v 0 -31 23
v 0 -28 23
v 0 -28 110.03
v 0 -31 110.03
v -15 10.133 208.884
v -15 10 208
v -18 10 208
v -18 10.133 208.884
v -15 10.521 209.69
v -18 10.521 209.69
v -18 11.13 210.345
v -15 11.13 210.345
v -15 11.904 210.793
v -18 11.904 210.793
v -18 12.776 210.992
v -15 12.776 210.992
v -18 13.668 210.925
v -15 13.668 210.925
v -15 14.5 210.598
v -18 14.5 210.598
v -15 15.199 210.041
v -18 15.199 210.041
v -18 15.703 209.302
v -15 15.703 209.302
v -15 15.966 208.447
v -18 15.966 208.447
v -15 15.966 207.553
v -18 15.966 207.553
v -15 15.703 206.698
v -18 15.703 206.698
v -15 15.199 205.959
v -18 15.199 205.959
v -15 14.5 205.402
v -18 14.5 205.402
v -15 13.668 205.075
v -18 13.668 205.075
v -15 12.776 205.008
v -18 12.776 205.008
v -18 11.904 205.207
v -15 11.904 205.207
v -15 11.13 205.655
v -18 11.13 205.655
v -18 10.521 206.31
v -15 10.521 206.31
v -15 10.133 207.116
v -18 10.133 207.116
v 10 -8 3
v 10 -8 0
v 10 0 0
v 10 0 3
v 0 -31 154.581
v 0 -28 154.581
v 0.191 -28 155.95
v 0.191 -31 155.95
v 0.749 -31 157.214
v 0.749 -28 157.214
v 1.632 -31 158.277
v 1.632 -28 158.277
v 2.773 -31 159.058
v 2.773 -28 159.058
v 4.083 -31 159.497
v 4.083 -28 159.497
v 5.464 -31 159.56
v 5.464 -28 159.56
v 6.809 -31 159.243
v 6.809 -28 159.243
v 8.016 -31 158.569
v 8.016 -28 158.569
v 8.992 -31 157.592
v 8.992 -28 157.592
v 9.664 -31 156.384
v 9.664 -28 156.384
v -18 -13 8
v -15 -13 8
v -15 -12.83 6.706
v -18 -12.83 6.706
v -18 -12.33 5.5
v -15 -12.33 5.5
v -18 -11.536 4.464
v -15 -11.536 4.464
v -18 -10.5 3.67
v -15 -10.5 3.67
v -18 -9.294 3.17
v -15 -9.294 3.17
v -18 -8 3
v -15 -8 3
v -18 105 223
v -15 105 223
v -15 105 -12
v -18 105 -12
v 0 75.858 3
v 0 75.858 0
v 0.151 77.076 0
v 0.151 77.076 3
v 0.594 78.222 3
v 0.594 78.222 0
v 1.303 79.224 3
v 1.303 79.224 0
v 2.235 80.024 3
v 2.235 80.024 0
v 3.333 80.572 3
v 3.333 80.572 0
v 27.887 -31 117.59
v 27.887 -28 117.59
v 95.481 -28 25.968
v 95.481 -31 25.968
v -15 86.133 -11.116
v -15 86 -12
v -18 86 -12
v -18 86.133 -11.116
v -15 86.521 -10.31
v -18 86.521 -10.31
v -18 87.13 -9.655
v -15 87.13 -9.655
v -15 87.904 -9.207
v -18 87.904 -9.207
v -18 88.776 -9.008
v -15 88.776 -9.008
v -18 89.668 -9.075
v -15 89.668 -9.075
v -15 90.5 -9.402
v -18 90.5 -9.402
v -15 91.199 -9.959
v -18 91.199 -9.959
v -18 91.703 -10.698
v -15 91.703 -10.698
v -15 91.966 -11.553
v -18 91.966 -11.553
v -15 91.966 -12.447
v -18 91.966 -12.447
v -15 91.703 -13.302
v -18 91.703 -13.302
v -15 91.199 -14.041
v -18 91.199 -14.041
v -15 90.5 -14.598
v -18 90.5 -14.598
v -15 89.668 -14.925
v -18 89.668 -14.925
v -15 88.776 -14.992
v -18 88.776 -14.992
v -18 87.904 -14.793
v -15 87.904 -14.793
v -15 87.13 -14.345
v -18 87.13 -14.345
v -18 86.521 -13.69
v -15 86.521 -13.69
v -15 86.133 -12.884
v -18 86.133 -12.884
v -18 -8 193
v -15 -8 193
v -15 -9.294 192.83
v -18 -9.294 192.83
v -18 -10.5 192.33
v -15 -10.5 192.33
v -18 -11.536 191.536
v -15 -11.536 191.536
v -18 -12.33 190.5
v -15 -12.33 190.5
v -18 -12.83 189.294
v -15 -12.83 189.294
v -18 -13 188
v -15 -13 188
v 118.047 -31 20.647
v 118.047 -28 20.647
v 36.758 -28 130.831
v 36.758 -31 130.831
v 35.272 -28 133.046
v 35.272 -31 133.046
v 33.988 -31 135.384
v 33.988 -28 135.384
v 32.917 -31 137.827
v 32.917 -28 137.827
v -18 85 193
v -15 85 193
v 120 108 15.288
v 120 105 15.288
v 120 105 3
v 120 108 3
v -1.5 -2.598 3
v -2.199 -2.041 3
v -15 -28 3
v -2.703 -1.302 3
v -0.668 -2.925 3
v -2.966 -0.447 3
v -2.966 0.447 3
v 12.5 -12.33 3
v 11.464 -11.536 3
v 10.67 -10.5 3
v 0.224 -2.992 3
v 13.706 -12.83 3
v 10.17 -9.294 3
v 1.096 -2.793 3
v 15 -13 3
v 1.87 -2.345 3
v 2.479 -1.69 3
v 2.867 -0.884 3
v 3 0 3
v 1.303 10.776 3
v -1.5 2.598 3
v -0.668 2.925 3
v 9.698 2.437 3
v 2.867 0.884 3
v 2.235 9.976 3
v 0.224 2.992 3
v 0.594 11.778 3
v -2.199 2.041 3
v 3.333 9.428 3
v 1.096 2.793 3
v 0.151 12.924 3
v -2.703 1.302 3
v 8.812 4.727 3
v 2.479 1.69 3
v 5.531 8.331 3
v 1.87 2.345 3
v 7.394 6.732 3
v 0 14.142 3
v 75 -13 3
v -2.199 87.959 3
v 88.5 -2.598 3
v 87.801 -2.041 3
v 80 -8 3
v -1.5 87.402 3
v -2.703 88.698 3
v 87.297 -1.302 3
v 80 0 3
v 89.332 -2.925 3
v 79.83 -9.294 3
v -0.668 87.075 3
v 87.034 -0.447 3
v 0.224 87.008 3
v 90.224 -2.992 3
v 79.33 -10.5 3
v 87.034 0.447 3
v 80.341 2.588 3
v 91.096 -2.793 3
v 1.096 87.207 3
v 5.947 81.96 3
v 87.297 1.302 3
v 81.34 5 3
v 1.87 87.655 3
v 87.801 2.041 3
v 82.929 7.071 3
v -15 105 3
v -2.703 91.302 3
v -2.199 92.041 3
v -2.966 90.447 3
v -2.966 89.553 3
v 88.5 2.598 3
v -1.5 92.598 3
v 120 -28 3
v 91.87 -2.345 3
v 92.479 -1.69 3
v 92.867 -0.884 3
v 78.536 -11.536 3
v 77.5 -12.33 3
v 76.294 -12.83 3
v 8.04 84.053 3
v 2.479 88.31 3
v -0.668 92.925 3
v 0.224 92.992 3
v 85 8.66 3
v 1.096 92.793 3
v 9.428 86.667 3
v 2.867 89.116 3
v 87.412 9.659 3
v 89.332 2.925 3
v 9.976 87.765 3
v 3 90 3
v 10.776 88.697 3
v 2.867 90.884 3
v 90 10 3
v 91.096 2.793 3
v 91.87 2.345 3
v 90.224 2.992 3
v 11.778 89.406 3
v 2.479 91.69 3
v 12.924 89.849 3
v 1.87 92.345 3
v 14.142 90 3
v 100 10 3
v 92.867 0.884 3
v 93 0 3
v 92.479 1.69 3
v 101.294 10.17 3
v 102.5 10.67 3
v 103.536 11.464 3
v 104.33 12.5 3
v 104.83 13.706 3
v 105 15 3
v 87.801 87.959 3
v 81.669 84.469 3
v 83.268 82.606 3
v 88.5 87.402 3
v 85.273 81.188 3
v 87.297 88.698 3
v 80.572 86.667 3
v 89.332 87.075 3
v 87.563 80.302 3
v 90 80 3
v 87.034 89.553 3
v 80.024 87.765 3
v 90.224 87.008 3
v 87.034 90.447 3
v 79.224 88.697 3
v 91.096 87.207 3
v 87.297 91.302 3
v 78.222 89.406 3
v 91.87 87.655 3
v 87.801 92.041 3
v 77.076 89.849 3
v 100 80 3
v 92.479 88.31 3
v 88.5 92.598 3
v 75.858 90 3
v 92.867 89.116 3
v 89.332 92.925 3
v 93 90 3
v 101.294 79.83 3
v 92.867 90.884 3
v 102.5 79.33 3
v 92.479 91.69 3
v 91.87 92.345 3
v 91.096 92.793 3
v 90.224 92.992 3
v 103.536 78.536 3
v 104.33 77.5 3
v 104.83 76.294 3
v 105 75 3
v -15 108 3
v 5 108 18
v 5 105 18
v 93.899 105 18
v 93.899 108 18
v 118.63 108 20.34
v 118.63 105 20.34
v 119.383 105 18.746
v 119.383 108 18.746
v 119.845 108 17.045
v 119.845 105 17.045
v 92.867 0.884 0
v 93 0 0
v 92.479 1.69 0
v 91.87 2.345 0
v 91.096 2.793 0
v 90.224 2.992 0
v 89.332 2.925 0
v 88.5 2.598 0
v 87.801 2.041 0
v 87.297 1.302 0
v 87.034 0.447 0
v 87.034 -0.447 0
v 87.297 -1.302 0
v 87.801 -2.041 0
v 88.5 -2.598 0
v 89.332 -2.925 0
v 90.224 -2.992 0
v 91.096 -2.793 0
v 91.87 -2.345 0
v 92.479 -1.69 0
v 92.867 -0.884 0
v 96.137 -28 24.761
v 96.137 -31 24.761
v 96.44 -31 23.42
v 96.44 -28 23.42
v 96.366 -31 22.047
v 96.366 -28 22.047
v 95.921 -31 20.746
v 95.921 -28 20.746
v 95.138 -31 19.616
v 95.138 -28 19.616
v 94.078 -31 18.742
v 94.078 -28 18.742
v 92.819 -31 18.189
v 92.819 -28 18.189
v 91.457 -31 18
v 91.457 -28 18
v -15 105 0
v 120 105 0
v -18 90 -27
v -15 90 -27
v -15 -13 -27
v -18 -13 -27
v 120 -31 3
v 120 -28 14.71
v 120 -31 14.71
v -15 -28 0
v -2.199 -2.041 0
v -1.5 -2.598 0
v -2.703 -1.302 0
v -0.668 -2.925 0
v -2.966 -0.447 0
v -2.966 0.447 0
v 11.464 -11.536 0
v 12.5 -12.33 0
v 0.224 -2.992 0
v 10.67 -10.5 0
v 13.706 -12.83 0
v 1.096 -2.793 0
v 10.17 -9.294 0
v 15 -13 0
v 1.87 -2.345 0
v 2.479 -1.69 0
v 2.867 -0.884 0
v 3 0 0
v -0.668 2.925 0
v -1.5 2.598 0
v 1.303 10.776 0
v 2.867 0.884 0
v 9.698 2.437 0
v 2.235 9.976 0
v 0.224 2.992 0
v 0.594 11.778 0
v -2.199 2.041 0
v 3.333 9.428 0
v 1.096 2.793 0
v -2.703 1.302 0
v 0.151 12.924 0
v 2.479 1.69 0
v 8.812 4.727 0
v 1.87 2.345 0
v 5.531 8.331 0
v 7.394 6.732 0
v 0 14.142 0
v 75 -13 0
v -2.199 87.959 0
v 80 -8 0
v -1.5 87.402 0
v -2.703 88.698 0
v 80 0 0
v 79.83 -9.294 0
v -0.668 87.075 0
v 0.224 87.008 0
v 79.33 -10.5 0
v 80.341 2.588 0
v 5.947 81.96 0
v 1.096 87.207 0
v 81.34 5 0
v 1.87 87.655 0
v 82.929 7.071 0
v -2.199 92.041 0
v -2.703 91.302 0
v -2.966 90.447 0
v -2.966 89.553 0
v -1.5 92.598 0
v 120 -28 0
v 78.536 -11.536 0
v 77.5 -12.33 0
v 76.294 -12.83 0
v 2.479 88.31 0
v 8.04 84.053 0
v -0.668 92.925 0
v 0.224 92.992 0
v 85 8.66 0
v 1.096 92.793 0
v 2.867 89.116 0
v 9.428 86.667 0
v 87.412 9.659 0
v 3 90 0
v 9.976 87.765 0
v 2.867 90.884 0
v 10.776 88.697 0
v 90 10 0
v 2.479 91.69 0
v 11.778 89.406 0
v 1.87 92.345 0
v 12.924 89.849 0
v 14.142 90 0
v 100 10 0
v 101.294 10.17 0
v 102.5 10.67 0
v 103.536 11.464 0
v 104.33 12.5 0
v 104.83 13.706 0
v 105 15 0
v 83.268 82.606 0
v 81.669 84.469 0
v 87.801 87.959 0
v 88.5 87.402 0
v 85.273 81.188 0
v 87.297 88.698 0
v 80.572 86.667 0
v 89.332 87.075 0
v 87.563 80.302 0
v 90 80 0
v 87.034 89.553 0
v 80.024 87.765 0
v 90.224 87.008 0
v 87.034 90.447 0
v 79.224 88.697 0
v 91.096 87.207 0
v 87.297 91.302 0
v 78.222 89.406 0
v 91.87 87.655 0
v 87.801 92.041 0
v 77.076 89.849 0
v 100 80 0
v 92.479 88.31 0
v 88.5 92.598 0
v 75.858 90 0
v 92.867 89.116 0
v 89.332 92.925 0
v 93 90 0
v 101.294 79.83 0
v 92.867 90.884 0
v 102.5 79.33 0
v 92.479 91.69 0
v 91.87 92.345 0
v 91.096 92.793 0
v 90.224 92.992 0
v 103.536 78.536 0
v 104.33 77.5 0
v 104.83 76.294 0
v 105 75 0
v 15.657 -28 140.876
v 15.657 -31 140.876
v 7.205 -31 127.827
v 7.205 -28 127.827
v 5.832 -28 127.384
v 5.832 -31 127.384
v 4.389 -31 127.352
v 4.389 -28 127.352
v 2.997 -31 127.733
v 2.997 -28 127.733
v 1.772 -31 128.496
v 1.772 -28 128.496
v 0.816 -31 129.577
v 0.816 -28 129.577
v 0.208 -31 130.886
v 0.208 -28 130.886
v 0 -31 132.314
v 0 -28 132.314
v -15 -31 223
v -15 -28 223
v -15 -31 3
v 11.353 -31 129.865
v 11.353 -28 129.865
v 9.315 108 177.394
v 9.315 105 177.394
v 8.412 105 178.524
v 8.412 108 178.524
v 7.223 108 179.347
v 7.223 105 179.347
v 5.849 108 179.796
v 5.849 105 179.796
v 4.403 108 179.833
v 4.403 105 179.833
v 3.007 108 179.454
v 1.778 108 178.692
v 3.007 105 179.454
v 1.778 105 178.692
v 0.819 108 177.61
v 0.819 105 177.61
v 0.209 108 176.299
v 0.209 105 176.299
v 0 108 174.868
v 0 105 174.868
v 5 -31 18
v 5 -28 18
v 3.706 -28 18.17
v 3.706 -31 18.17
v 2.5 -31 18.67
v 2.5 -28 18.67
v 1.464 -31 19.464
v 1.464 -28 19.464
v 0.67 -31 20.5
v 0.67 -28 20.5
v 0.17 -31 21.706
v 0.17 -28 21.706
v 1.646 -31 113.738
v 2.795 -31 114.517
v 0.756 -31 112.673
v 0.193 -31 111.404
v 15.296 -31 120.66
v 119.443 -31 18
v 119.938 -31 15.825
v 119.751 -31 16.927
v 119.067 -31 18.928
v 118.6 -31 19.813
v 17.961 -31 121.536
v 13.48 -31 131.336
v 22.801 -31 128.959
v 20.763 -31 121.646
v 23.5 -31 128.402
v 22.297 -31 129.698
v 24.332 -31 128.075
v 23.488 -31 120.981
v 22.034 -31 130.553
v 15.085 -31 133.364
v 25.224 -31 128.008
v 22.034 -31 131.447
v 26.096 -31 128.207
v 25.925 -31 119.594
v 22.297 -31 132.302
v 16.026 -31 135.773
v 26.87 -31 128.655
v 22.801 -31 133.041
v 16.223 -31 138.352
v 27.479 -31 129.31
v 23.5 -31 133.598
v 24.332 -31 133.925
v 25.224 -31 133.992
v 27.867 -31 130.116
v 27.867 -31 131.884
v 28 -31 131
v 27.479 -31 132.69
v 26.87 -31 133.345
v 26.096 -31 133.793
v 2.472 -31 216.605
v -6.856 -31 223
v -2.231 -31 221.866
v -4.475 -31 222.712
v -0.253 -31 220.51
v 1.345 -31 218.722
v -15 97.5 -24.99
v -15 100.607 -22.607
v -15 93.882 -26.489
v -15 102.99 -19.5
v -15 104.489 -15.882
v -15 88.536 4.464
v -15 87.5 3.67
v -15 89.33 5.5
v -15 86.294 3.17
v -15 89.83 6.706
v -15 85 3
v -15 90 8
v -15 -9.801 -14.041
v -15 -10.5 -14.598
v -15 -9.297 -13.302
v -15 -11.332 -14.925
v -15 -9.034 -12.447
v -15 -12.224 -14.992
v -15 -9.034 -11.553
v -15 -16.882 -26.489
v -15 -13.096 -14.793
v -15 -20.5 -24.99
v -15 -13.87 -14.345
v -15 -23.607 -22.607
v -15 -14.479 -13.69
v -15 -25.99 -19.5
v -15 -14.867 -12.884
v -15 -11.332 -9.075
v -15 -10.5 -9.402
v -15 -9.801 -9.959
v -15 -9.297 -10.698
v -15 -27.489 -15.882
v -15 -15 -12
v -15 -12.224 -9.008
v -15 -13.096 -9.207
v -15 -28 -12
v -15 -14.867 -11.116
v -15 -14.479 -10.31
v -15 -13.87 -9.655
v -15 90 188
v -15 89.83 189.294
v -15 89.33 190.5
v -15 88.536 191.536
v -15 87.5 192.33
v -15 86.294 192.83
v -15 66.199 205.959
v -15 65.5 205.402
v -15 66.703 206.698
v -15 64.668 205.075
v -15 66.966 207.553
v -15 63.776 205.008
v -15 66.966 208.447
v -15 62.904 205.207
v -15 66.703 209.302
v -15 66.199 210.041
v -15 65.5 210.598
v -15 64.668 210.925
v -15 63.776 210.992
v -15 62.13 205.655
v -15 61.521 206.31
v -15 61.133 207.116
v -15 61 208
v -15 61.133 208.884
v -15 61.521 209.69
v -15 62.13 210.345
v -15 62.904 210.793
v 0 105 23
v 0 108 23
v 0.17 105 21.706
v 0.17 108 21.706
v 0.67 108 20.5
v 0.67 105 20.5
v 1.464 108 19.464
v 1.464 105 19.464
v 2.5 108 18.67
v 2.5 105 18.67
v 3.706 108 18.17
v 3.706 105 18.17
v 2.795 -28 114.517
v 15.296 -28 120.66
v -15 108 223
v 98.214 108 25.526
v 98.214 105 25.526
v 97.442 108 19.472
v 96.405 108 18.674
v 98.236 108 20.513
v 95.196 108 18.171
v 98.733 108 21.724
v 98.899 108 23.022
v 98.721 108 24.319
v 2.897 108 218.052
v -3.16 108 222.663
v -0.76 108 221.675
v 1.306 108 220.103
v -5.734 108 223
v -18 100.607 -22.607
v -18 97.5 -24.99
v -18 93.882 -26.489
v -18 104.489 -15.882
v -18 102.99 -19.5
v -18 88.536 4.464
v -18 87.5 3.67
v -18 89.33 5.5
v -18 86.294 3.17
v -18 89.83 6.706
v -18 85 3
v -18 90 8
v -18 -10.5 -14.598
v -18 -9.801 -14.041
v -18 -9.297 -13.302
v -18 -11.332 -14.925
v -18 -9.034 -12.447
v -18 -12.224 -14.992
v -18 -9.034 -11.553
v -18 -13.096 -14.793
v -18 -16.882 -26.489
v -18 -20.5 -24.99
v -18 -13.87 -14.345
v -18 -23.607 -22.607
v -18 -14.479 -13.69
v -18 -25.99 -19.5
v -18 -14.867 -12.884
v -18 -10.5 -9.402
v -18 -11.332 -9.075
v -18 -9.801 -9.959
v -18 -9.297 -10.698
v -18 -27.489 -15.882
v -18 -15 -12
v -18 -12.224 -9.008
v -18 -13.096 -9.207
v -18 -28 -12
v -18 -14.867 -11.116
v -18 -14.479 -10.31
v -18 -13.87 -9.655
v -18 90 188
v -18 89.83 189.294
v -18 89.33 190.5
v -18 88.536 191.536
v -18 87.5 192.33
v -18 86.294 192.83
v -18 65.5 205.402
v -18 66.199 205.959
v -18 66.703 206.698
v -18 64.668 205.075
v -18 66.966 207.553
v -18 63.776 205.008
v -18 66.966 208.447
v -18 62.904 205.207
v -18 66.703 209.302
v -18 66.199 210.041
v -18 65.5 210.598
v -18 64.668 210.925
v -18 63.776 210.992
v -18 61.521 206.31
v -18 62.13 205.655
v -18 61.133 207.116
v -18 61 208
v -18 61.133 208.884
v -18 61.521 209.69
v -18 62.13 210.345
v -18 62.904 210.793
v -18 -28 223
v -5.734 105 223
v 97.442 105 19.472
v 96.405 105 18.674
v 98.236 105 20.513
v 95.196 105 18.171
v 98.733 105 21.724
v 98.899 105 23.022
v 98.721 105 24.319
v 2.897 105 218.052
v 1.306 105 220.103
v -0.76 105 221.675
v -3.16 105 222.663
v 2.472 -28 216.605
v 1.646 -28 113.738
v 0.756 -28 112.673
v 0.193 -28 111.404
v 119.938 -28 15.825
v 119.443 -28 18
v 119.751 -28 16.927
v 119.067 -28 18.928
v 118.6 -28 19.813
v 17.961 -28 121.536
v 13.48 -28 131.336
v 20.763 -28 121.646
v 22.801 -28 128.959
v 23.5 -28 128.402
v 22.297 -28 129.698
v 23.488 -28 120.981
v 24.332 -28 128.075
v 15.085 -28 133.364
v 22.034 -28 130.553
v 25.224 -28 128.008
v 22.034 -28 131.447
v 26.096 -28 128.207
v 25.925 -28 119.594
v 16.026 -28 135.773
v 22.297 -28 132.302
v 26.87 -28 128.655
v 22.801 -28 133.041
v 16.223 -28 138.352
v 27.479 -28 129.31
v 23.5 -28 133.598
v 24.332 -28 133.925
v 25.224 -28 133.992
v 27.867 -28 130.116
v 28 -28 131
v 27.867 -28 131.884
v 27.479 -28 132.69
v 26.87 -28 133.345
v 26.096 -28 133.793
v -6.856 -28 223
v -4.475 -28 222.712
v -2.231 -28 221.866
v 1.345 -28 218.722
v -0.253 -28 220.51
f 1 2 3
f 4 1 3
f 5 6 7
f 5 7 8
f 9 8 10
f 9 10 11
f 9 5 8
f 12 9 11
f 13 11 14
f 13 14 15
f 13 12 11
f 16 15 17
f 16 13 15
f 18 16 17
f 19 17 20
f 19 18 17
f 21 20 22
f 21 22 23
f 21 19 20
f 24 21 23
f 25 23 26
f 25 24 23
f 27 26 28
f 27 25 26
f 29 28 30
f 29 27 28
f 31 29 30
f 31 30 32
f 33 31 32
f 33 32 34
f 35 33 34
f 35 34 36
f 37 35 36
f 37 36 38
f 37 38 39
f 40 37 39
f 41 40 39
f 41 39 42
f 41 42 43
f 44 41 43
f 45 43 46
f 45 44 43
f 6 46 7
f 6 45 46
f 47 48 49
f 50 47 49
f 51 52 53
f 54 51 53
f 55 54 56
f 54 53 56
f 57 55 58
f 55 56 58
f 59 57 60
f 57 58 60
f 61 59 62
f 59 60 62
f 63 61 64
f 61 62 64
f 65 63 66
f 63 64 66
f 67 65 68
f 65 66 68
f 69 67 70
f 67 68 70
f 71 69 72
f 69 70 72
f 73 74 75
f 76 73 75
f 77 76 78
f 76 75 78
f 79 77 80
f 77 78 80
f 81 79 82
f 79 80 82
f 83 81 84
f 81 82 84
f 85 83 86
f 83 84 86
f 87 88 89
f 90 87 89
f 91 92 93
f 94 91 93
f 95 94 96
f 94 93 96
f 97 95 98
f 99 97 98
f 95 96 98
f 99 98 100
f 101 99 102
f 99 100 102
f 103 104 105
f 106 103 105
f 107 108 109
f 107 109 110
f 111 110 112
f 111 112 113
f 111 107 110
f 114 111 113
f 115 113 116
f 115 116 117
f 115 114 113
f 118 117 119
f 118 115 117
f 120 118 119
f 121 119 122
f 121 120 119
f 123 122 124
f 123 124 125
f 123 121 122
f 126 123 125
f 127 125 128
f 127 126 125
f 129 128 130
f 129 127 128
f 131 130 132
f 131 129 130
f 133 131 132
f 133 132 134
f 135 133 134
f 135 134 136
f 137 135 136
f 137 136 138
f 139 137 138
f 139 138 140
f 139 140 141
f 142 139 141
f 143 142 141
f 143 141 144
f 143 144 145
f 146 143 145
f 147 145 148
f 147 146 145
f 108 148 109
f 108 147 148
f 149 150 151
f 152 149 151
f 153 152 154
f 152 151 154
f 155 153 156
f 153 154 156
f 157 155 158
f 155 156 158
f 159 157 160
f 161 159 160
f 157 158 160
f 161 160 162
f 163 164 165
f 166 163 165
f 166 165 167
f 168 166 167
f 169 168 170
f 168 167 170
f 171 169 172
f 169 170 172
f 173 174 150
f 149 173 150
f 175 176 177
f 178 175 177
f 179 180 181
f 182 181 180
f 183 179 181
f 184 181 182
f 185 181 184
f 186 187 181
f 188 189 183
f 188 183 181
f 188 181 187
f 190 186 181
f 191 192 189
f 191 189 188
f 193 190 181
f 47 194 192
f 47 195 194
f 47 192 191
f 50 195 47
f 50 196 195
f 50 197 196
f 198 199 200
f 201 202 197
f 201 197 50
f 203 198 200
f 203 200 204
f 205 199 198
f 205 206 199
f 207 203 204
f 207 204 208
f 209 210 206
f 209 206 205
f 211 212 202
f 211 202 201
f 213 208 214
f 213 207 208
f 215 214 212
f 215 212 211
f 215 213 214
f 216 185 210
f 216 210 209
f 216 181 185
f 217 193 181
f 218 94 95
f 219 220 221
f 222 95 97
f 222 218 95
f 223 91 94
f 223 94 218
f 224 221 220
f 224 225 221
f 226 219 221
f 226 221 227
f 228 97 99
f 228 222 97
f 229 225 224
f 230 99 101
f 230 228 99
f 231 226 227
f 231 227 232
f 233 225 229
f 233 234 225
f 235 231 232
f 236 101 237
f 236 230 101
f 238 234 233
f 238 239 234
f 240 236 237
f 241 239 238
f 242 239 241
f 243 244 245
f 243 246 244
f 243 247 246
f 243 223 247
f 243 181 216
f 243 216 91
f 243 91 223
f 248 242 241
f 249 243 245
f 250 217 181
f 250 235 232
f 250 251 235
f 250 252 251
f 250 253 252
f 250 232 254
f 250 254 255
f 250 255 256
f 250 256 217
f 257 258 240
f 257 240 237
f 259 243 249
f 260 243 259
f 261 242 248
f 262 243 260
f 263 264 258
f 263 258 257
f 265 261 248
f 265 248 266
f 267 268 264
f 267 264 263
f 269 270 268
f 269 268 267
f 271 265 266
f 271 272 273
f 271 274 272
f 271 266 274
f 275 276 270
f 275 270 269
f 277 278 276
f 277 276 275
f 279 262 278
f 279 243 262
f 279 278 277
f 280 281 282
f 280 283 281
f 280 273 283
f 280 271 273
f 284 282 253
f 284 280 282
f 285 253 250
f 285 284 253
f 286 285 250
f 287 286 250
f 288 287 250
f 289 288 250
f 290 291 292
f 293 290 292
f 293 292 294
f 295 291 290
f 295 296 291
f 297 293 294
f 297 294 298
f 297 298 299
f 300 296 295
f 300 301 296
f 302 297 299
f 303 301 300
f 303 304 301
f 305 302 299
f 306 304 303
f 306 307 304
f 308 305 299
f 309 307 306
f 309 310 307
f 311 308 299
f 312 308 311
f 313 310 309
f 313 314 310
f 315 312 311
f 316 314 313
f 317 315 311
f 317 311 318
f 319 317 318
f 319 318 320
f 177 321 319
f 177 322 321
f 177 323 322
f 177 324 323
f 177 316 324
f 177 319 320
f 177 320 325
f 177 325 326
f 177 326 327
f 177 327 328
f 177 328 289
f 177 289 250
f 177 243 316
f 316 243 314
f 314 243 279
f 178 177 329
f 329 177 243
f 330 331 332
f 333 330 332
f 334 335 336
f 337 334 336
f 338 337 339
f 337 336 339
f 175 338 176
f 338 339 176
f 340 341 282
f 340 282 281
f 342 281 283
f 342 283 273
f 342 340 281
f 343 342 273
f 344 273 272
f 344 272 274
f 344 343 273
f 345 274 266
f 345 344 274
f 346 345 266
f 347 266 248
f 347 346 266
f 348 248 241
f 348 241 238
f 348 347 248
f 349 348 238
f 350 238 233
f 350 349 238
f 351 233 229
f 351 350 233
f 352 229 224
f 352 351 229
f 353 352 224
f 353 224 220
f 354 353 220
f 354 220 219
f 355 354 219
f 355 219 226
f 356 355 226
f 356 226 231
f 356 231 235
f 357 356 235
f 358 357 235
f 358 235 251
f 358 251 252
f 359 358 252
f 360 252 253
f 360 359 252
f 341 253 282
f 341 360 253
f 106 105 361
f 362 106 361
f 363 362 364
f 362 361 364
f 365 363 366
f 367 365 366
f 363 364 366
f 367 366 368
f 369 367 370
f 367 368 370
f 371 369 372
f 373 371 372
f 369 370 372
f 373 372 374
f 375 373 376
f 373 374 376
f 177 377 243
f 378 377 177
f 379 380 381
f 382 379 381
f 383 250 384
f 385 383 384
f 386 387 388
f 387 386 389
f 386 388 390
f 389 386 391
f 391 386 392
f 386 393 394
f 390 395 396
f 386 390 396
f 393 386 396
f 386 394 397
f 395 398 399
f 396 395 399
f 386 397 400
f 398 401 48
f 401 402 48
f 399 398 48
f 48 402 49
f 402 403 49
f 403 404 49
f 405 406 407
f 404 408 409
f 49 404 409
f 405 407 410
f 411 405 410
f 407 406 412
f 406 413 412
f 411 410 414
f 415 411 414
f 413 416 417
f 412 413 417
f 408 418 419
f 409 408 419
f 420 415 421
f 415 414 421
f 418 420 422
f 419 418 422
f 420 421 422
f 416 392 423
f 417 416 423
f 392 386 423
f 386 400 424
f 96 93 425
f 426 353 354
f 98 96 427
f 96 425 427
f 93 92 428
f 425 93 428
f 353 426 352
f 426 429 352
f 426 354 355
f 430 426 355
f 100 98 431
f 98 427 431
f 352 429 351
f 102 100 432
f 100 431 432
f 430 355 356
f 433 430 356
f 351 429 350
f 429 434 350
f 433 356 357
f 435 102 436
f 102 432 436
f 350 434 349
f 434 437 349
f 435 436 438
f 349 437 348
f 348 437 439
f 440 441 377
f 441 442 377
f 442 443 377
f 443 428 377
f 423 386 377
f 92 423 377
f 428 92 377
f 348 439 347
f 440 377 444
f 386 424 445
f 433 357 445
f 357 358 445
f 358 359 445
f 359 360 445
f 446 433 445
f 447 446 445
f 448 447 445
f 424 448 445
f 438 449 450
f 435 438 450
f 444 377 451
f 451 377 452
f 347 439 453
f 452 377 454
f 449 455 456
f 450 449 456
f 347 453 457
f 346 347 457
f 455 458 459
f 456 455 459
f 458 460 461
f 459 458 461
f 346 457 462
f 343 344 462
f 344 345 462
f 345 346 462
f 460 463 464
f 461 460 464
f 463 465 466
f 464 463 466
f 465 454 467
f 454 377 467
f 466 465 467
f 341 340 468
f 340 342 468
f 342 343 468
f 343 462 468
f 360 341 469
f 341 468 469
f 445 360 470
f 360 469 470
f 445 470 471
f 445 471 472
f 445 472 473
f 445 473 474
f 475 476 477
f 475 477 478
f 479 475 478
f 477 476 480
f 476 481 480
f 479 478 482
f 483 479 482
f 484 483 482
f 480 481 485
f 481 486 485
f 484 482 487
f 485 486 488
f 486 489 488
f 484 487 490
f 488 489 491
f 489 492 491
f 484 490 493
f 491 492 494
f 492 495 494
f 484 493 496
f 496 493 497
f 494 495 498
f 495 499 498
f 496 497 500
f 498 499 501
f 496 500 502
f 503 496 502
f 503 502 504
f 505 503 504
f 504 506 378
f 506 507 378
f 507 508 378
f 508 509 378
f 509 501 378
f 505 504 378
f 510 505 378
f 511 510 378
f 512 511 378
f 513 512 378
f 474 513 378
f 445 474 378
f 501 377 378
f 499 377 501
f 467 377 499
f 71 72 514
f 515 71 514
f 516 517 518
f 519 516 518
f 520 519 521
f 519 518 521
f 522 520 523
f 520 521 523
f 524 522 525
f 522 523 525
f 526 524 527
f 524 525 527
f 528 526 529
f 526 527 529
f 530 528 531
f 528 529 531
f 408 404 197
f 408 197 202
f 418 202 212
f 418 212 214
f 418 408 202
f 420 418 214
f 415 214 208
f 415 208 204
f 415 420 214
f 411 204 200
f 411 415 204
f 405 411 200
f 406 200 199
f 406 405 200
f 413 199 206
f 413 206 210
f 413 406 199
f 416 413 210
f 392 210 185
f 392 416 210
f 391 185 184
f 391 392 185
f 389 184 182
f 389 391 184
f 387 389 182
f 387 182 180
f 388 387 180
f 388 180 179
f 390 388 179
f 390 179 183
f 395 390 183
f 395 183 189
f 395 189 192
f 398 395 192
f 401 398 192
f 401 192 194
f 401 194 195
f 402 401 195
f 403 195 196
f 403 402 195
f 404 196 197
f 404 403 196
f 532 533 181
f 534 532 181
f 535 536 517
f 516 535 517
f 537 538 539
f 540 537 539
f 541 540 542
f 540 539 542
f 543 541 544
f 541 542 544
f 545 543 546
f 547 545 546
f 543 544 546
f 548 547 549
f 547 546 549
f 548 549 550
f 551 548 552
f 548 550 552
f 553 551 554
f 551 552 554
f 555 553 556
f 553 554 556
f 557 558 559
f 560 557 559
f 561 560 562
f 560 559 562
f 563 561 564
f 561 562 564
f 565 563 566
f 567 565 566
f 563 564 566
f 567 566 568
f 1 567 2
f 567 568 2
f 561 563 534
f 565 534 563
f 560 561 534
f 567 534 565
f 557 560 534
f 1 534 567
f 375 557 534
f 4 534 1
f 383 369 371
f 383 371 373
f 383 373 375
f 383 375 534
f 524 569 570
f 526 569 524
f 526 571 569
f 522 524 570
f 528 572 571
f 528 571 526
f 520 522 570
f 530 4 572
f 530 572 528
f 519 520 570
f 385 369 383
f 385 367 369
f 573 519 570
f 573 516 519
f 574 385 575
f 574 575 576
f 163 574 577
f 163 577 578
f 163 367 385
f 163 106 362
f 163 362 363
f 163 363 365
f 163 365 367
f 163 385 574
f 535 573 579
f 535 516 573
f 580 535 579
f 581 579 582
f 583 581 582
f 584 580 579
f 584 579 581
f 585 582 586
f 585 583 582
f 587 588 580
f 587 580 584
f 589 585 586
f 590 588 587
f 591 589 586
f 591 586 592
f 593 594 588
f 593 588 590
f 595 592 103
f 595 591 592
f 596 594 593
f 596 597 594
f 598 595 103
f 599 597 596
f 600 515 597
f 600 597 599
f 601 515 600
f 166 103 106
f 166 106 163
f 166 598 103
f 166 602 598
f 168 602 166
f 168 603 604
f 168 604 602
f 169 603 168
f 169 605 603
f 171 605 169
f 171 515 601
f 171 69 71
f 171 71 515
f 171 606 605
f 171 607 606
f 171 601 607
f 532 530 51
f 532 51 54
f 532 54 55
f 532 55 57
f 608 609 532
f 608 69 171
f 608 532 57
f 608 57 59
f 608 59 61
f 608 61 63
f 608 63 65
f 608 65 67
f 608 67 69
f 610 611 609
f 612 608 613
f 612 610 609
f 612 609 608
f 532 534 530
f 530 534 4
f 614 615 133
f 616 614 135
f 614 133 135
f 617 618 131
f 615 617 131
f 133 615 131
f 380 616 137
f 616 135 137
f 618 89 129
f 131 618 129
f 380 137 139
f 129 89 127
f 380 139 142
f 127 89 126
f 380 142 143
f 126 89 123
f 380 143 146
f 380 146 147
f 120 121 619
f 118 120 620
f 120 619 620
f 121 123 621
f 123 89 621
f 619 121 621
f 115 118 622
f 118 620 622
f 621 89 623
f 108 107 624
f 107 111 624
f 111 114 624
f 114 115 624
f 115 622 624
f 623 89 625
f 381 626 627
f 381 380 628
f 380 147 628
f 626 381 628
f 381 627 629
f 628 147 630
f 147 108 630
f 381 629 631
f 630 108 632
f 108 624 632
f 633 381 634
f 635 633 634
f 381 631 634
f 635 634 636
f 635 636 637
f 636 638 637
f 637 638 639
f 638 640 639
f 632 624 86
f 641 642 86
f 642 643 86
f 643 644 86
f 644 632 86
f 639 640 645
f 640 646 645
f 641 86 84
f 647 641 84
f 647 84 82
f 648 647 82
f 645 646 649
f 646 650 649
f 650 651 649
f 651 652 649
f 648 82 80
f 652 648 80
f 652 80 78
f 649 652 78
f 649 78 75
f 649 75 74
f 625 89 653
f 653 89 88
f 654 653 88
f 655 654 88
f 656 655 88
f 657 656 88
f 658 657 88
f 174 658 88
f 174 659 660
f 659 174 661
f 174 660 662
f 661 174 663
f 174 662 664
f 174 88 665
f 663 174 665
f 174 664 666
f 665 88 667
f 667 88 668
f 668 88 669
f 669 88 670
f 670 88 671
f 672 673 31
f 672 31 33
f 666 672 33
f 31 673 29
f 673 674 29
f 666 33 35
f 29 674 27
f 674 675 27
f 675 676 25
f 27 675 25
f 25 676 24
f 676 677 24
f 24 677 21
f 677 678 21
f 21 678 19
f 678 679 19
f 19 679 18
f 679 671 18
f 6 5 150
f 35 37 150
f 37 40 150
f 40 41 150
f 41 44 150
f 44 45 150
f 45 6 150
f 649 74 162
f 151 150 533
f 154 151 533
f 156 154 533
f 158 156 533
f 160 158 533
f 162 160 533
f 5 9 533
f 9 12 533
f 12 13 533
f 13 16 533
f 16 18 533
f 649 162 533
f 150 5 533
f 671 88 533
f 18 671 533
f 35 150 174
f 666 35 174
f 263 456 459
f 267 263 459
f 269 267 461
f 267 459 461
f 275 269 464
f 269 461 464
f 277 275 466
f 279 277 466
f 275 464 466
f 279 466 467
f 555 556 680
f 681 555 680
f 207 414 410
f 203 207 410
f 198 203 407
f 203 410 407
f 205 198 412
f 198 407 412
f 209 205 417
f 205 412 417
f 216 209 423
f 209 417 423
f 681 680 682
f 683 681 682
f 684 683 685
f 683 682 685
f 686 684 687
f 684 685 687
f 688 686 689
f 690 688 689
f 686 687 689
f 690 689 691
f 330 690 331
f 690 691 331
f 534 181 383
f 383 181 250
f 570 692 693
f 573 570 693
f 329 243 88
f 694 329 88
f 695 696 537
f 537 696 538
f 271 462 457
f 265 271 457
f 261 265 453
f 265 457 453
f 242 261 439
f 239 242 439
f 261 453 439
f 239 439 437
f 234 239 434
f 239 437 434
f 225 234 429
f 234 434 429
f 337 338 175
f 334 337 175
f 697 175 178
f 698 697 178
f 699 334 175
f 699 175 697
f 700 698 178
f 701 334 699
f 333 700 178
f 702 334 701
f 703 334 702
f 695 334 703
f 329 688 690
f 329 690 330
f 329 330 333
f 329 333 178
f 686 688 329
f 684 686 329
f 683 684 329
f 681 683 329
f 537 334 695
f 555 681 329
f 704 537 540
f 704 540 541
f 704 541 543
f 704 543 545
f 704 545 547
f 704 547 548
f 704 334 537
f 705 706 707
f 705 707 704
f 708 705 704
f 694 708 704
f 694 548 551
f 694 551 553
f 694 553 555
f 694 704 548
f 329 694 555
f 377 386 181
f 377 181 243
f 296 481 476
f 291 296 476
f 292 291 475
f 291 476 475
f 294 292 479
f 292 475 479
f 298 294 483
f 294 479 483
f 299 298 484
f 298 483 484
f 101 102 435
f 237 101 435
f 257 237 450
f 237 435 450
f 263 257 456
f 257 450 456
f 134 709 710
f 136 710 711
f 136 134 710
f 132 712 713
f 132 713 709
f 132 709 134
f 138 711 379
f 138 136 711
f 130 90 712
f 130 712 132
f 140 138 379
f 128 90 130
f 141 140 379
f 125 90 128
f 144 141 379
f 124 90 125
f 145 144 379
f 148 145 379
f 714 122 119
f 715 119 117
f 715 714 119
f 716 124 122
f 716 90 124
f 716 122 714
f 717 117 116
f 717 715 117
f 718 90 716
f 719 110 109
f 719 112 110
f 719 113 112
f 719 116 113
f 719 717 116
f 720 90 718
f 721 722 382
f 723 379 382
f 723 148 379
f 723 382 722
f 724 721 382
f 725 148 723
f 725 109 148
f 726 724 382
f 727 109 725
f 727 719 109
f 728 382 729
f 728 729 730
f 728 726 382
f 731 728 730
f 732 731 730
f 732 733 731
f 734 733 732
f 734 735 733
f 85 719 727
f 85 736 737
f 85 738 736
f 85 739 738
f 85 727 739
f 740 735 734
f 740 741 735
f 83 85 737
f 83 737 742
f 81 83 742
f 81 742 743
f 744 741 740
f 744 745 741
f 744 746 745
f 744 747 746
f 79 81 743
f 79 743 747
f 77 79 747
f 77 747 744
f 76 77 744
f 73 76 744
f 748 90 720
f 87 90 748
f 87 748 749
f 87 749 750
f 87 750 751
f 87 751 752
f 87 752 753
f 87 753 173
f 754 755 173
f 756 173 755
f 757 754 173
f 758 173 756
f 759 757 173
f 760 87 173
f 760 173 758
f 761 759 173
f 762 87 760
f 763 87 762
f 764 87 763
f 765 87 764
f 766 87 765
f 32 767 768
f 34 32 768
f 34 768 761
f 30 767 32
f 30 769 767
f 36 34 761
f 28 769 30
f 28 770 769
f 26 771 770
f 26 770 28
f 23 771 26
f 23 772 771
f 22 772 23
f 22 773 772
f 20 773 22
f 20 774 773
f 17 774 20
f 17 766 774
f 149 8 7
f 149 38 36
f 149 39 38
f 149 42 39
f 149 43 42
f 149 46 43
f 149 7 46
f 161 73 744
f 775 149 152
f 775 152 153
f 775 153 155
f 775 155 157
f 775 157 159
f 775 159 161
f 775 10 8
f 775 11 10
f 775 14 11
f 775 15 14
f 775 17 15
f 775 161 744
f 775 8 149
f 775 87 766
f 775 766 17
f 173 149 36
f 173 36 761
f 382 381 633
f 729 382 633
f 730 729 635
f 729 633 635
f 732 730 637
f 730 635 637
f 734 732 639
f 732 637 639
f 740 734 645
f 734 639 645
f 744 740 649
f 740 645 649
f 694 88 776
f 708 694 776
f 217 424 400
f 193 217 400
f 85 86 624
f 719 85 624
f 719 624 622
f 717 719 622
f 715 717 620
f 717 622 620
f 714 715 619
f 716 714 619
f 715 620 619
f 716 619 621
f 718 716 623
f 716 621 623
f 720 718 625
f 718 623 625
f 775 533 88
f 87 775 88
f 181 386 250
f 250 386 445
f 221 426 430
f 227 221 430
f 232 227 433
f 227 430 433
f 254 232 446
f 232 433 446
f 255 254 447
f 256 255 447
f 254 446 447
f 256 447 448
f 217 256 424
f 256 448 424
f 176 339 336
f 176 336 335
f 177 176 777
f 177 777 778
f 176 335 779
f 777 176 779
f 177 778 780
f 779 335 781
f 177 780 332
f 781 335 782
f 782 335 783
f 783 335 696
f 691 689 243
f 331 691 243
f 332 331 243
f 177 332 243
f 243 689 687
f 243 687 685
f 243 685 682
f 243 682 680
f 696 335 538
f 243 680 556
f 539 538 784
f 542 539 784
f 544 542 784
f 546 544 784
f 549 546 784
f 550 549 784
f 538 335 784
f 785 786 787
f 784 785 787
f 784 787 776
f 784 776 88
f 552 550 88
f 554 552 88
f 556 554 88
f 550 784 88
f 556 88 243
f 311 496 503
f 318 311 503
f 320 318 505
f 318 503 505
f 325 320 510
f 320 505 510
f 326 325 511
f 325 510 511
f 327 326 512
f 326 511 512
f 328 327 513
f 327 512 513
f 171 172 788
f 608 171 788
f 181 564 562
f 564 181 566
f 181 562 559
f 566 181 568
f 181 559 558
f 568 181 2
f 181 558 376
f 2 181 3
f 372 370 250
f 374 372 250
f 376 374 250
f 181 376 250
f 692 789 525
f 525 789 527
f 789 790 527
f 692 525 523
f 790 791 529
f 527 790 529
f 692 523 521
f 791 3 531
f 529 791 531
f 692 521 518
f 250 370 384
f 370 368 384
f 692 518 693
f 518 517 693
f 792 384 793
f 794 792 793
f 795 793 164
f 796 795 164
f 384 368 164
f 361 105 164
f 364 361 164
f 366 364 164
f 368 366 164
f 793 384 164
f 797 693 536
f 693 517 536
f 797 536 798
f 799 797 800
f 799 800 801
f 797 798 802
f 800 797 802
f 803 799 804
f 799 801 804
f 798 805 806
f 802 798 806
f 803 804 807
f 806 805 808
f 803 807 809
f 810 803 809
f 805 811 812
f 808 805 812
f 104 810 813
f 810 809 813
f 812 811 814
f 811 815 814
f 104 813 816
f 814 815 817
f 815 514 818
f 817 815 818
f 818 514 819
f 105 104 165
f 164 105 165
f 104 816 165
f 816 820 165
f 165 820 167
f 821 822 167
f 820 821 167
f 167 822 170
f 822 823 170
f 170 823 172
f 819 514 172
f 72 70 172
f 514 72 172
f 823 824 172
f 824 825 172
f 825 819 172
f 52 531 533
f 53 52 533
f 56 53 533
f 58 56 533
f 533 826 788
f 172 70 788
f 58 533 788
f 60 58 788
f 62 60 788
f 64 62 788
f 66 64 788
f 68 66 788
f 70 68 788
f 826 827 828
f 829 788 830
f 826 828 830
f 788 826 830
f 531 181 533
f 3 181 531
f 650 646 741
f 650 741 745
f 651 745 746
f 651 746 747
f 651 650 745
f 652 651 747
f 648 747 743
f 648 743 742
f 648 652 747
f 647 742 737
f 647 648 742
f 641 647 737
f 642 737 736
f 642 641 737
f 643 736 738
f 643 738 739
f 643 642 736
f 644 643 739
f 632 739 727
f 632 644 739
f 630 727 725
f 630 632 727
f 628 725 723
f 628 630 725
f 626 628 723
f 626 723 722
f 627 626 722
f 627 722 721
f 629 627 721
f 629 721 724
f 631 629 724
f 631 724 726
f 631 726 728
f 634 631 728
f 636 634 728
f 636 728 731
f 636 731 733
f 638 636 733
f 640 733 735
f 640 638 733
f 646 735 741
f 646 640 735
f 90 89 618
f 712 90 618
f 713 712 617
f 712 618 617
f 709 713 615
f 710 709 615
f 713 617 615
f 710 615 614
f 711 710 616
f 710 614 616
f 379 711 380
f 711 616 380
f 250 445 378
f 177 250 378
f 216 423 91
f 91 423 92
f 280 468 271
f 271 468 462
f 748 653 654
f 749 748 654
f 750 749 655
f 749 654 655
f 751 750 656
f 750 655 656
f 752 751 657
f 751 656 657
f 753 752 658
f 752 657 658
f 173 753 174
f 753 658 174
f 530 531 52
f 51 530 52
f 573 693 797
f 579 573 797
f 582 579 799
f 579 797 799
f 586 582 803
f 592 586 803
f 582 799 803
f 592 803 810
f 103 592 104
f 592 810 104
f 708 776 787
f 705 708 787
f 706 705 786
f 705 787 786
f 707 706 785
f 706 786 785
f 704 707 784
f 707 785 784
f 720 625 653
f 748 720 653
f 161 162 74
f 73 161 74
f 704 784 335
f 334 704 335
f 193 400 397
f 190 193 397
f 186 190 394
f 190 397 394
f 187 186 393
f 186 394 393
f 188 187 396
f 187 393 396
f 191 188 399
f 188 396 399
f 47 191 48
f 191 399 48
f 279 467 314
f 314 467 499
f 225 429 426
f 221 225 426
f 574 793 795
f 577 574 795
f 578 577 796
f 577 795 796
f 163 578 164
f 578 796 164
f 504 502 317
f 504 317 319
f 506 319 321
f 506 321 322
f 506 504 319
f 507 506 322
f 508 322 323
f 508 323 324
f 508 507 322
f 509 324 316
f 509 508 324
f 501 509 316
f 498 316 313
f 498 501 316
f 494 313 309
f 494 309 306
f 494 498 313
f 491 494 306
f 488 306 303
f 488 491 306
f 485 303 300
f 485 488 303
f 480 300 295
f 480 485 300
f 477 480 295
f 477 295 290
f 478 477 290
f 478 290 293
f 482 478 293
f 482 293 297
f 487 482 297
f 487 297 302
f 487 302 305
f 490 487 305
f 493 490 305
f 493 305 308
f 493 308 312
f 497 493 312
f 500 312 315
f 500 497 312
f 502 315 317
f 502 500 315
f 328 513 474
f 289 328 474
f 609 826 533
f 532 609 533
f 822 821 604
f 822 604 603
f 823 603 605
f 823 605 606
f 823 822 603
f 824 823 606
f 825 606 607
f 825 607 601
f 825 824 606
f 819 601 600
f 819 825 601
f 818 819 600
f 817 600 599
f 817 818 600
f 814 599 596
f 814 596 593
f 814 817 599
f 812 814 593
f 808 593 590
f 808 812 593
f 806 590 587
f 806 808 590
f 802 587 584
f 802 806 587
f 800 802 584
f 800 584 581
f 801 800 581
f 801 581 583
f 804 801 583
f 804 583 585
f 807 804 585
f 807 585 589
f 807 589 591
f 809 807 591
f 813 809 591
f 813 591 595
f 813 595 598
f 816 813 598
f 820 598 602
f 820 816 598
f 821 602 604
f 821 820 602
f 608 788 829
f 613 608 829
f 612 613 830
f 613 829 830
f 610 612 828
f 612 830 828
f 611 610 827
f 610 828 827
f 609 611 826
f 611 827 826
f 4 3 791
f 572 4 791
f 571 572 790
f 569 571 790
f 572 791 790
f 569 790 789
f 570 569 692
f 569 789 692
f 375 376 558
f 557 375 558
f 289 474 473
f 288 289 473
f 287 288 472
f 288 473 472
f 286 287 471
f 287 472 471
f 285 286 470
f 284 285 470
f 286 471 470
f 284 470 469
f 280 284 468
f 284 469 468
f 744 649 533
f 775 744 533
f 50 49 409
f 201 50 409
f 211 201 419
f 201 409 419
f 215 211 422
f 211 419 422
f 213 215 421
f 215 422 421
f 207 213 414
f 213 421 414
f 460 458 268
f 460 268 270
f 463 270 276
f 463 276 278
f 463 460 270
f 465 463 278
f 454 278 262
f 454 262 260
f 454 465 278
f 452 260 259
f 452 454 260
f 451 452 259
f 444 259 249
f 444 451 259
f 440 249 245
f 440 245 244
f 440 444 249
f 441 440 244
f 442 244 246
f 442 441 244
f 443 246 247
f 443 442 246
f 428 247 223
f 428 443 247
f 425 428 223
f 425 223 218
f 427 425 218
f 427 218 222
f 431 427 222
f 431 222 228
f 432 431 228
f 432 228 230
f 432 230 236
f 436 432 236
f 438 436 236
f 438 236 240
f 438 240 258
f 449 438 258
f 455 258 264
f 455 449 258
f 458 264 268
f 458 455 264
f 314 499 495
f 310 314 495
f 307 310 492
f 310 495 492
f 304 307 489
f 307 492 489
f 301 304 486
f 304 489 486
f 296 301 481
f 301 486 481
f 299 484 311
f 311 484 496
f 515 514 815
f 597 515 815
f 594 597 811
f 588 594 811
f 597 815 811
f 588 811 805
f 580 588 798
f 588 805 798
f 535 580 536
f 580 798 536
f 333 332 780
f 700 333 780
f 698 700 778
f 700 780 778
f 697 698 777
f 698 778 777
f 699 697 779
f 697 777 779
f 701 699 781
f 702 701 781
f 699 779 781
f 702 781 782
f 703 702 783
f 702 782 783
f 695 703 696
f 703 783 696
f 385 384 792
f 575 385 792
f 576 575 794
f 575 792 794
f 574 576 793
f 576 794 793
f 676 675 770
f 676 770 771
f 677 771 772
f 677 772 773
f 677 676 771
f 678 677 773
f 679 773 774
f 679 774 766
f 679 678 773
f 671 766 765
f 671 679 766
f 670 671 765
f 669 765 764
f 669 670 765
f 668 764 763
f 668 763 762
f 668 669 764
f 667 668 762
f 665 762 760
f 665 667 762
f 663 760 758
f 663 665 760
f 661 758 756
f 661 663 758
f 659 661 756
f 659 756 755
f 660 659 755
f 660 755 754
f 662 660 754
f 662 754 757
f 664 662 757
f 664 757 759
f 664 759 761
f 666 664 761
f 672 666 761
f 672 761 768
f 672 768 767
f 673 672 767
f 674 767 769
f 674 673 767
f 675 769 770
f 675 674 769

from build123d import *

# Parameters (mm, degrees)
F0_W     = 135
F0_H     = 133
F0_R     = 3
F1_DEPTH = 3
F2_R     = 3
F3_DEPTH = 3
F5_DEPTH = 3
F6_R     = 3
F7_DEPTH = 3


with BuildPart() as f1:
    # F0 (on Top) → F1 (new body)
    with BuildSketch(Plane.XY):
        with Locations((52.5, 38.5)):
            Rectangle(F0_W, F0_H)
        Circle(F0_R, mode=Mode.SUBTRACT)
        with Locations((90, 0)):
            Circle(F0_R, mode=Mode.SUBTRACT)
        with Locations((0, 90)):
            Circle(F0_R, mode=Mode.SUBTRACT)
        with BuildLine():
            ThreePointArc((0, 75.857864), (0.917517, 78.744616), (3.333333, 80.57191))
            ThreePointArc((3.333333, 80.57191), (7.071068, 82.928932), (9.42809, 86.666667))
            ThreePointArc((9.42809, 86.666667), (11.255384, 89.082483), (14.142136, 90))
            Line((14.142136, 90), (75.857864, 90))
            ThreePointArc((75.857864, 90), (78.744616, 89.082483), (80.57191, 86.666667))
            ThreePointArc((80.57191, 86.666667), (84.226497, 81.835034), (90, 80))
            Line((90, 80), (100, 80))
            ThreePointArc((100, 80), (103.535534, 78.535534), (105, 75))
            Line((105, 75), (105, 15))
            ThreePointArc((105, 15), (103.535534, 11.464466), (100, 10))
            Line((100, 10), (90, 10))
            ThreePointArc((90, 10), (82.928932, 7.071068), (80, 0))
            Line((80, 0), (80, -8))
            ThreePointArc((80, -8), (78.535534, -11.535534), (75, -13))
            Line((75, -13), (15, -13))
            ThreePointArc((15, -13), (11.464466, -11.535534), (10, -8))
            Line((10, -8), (10, 0))
            ThreePointArc((10, 0), (8.164966, 5.773503), (3.333333, 9.42809))
            ThreePointArc((3.333333, 9.42809), (0.917517, 11.255384), (0, 14.142136))
            Line((0, 14.142136), (0, 75.857864))
        make_face(mode=Mode.SUBTRACT)
        with Locations((90, 90)):
            Circle(F0_R, mode=Mode.SUBTRACT)
    extrude(amount=F1_DEPTH)


with BuildPart() as f3:
    # F2 (on face) → F3 (new body)
    with BuildSketch(Plane(origin=(-15, 0, 0), x_dir=(0, -1, 0), z_dir=(-1, 0, 0))):
        with BuildLine():
            Line((28, 223), (-105, 223))
            Line((-105, 223), (-105, 3))
            Line((-105, 3), (-105, -12))
            ThreePointArc((-105, -12), (-100.606602, -22.606602), (-90, -27))
            Line((-90, -27), (13, -27))
            ThreePointArc((13, -27), (23.606602, -22.606602), (28, -12))
            Line((28, -12), (28, 3))
            Line((28, 3), (28, 223))
        make_face()
        with Locations((-89, -12)):
            Circle(F2_R, mode=Mode.SUBTRACT)
        with Locations((12, -12)):
            Circle(F2_R, mode=Mode.SUBTRACT)
        with BuildLine():
            Line((8, 3), (-85, 3))
            ThreePointArc((-85, 3), (-88.535534, 4.464466), (-90, 8))
            Line((-90, 8), (-90, 188))
            ThreePointArc((-90, 188), (-88.535534, 191.535534), (-85, 193))
            Line((-85, 193), (8, 193))
            ThreePointArc((8, 193), (11.535534, 191.535534), (13, 188))
            Line((13, 188), (13, 8))
            ThreePointArc((13, 8), (11.535534, 4.464466), (8, 3))
        make_face(mode=Mode.SUBTRACT)
        with Locations((-64, 208)):
            Circle(F2_R, mode=Mode.SUBTRACT)
        with Locations((-13, 208)):
            Circle(F2_R, mode=Mode.SUBTRACT)
    extrude(amount=F3_DEPTH)


with BuildPart() as f5:
    # F4 (on face) → F5 (new body)
    with BuildSketch(Plane(origin=(0, 105, 0), x_dir=(-1, 0, 0), z_dir=(0, 1, 0))):
        with BuildLine():
            Line((-120, 3), (15, 3))
            Line((15, 3), (15, 223))
            Line((15, 223), (5.733633, 223))
            ThreePointArc((5.733633, 223), (0.759596, 221.675192), (-2.896512, 218.051792))
            Line((-2.896512, 218.051792), (-118.630145, 20.340169))
            ThreePointArc((-118.630145, 20.340169), (-119.651462, 17.90549), (-120, 15.288377))
            Line((-120, 15.288377), (-120, 3))
        make_face()
        with BuildLine():
            Line((-5, 18), (-93.898588, 18))
            ThreePointArc((-93.898588, 18), (-98.236184, 20.512982), (-98.213661, 25.525896))
            Line((-98.213661, 25.525896), (-9.315072, 177.394318))
            ThreePointArc((-9.315072, 177.394318), (-3.691444, 179.694153), (0, 174.868422))
            Line((0, 174.868422), (0, 23))
            ThreePointArc((0, 23), (-1.464466, 19.464466), (-5, 18))
        make_face(mode=Mode.SUBTRACT)
    extrude(amount=F5_DEPTH)


with BuildPart() as f7:
    # F6 (on face) → F7 (new body)
    with BuildSketch(Plane.XZ.offset(28)):
        with BuildLine():
            Line((-15, 223), (-15, 3))
            Line((-15, 3), (120, 3))
            Line((120, 3), (120, 14.71041))
            ThreePointArc((120, 14.71041), (119.859879, 16.378579), (119.443442, 18))
            ThreePointArc((119.443442, 18), (118.844842, 19.376112), (118.047055, 20.647151))
            Line((118.047055, 20.647151), (36.758444, 130.831147))
            ThreePointArc((36.758444, 130.831147), (34.603862, 134.200678), (32.916642, 137.826867))
            Line((32.916642, 137.826867), (2.471523, 216.604835))
            ThreePointArc((2.471523, 216.604835), (-1.201416, 221.247677), (-6.856133, 223))
            Line((-6.856133, 223), (-15, 223))
        make_face()
        with BuildLine():
            ThreePointArc((0, 110.029648), (0.755836, 112.672955), (2.794828, 114.517099))
            Line((2.794828, 114.517099), (15.296228, 120.660393))
            ThreePointArc((15.296228, 120.660393), (22.148553, 121.408662), (27.887004, 117.589703))
            Line((27.887004, 117.589703), (95.480948, 25.968371))
            ThreePointArc((95.480948, 25.968371), (95.920707, 20.74632), (91.457421, 18))
            Line((91.457421, 18), (5, 18))
            ThreePointArc((5, 18), (1.464466, 19.464466), (0, 23))
            Line((0, 23), (0, 110.029648))
        make_face(mode=Mode.SUBTRACT)
        with BuildLine():
            Line((11.352975, 129.864827), (7.205172, 127.826561))
            ThreePointArc((7.205172, 127.826561), (2.356693, 128.069849), (0, 132.314013))
            Line((0, 132.314013), (0, 154.581261))
            ThreePointArc((0, 154.581261), (4.08325, 159.4965), (9.663828, 156.383679))
            Line((9.663828, 156.383679), (15.657094, 140.875861))
            ThreePointArc((15.657094, 140.875861), (15.644907, 134.533886), (11.352975, 129.864827))
        make_face(mode=Mode.SUBTRACT)
        with Locations((25, 131)):
            Circle(F6_R, mode=Mode.SUBTRACT)
    extrude(amount=F7_DEPTH)


solid = Compound([f1.part, f3.part, f5.part, f7.part])
